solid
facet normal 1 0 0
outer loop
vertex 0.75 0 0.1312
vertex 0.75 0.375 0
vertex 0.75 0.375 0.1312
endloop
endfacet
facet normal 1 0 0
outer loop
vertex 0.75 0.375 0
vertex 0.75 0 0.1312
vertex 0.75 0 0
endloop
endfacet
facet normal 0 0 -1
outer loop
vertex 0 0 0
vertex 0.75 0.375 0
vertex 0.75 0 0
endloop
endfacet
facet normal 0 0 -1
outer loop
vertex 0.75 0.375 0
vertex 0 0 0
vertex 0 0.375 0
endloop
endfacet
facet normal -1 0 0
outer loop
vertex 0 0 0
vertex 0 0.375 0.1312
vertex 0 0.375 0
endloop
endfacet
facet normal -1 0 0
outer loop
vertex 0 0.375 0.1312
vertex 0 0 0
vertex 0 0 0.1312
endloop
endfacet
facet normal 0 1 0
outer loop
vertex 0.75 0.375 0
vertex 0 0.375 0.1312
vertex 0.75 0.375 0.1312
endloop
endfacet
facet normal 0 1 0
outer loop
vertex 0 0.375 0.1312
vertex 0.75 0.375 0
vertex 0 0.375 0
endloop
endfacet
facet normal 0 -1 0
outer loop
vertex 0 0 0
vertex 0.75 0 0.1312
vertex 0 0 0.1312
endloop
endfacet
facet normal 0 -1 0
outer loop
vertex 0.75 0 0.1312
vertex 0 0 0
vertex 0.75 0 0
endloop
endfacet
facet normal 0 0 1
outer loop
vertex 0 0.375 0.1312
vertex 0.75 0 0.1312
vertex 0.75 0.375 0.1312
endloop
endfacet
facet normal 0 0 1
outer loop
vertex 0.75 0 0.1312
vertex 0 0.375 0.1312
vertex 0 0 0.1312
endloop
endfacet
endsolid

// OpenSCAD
$fn = 100;

// Base parameters
base_len = 0.75;
base_wid = 0.375;
base_ht = 0.0375;

// Raised upper material parameters
raised_len = 0.75;
raised_wid = 0.375;
raised_ht = 0.0937;
raised_z = base_ht;

// Left narrower solid parameters
left_len = 0.0319;
left_wid = 0.3094;
left_ht = 0.0562;
left_x = 0;
left_y = 0.0281;
left_z = base_ht;

// Annular post parameters
post_ht = 0.0937;
post_z = base_ht;
post_y = 0.1875;
post_x = [0.15, 0.3, 0.45, 0.6];
post_r_out = [0.0469, 0.0469, 0.0562, 0.0562];
post_r_in = [0.0188, 0.0197, 0.0216, 0.0234];

// Main model assembly
union() {
    // Create main rectangular base
    cube([base_len, base_wid, base_ht]);

    // Add raised rectangular upper material flush to base edges
    translate([0, 0, raised_z])
        cube([raised_len, raised_wid, raised_ht]);

    // Add narrower rectangular solid at the left end
    translate([left_x, left_y, left_z])
        cube([left_len, left_wid, left_ht]);

    // Place four annular cylindrical posts on the upper face
    for (i = [0:3]) {
        translate([post_x[i], post_y, post_z])
            annular_post(post_ht, post_r_out[i], post_r_in[i]);
    }
}

// Module to generate annular posts with through holes
module annular_post(h, r_outer, r_inner) {
    difference() {
        cylinder(h = h, r = r_outer);
        // Slight over-extension prevents coplanar face artifacts during boolean subtraction
        translate([0, 0, -0.001])
            cylinder(h = h + 0.002, r = r_inner);
    }
}
